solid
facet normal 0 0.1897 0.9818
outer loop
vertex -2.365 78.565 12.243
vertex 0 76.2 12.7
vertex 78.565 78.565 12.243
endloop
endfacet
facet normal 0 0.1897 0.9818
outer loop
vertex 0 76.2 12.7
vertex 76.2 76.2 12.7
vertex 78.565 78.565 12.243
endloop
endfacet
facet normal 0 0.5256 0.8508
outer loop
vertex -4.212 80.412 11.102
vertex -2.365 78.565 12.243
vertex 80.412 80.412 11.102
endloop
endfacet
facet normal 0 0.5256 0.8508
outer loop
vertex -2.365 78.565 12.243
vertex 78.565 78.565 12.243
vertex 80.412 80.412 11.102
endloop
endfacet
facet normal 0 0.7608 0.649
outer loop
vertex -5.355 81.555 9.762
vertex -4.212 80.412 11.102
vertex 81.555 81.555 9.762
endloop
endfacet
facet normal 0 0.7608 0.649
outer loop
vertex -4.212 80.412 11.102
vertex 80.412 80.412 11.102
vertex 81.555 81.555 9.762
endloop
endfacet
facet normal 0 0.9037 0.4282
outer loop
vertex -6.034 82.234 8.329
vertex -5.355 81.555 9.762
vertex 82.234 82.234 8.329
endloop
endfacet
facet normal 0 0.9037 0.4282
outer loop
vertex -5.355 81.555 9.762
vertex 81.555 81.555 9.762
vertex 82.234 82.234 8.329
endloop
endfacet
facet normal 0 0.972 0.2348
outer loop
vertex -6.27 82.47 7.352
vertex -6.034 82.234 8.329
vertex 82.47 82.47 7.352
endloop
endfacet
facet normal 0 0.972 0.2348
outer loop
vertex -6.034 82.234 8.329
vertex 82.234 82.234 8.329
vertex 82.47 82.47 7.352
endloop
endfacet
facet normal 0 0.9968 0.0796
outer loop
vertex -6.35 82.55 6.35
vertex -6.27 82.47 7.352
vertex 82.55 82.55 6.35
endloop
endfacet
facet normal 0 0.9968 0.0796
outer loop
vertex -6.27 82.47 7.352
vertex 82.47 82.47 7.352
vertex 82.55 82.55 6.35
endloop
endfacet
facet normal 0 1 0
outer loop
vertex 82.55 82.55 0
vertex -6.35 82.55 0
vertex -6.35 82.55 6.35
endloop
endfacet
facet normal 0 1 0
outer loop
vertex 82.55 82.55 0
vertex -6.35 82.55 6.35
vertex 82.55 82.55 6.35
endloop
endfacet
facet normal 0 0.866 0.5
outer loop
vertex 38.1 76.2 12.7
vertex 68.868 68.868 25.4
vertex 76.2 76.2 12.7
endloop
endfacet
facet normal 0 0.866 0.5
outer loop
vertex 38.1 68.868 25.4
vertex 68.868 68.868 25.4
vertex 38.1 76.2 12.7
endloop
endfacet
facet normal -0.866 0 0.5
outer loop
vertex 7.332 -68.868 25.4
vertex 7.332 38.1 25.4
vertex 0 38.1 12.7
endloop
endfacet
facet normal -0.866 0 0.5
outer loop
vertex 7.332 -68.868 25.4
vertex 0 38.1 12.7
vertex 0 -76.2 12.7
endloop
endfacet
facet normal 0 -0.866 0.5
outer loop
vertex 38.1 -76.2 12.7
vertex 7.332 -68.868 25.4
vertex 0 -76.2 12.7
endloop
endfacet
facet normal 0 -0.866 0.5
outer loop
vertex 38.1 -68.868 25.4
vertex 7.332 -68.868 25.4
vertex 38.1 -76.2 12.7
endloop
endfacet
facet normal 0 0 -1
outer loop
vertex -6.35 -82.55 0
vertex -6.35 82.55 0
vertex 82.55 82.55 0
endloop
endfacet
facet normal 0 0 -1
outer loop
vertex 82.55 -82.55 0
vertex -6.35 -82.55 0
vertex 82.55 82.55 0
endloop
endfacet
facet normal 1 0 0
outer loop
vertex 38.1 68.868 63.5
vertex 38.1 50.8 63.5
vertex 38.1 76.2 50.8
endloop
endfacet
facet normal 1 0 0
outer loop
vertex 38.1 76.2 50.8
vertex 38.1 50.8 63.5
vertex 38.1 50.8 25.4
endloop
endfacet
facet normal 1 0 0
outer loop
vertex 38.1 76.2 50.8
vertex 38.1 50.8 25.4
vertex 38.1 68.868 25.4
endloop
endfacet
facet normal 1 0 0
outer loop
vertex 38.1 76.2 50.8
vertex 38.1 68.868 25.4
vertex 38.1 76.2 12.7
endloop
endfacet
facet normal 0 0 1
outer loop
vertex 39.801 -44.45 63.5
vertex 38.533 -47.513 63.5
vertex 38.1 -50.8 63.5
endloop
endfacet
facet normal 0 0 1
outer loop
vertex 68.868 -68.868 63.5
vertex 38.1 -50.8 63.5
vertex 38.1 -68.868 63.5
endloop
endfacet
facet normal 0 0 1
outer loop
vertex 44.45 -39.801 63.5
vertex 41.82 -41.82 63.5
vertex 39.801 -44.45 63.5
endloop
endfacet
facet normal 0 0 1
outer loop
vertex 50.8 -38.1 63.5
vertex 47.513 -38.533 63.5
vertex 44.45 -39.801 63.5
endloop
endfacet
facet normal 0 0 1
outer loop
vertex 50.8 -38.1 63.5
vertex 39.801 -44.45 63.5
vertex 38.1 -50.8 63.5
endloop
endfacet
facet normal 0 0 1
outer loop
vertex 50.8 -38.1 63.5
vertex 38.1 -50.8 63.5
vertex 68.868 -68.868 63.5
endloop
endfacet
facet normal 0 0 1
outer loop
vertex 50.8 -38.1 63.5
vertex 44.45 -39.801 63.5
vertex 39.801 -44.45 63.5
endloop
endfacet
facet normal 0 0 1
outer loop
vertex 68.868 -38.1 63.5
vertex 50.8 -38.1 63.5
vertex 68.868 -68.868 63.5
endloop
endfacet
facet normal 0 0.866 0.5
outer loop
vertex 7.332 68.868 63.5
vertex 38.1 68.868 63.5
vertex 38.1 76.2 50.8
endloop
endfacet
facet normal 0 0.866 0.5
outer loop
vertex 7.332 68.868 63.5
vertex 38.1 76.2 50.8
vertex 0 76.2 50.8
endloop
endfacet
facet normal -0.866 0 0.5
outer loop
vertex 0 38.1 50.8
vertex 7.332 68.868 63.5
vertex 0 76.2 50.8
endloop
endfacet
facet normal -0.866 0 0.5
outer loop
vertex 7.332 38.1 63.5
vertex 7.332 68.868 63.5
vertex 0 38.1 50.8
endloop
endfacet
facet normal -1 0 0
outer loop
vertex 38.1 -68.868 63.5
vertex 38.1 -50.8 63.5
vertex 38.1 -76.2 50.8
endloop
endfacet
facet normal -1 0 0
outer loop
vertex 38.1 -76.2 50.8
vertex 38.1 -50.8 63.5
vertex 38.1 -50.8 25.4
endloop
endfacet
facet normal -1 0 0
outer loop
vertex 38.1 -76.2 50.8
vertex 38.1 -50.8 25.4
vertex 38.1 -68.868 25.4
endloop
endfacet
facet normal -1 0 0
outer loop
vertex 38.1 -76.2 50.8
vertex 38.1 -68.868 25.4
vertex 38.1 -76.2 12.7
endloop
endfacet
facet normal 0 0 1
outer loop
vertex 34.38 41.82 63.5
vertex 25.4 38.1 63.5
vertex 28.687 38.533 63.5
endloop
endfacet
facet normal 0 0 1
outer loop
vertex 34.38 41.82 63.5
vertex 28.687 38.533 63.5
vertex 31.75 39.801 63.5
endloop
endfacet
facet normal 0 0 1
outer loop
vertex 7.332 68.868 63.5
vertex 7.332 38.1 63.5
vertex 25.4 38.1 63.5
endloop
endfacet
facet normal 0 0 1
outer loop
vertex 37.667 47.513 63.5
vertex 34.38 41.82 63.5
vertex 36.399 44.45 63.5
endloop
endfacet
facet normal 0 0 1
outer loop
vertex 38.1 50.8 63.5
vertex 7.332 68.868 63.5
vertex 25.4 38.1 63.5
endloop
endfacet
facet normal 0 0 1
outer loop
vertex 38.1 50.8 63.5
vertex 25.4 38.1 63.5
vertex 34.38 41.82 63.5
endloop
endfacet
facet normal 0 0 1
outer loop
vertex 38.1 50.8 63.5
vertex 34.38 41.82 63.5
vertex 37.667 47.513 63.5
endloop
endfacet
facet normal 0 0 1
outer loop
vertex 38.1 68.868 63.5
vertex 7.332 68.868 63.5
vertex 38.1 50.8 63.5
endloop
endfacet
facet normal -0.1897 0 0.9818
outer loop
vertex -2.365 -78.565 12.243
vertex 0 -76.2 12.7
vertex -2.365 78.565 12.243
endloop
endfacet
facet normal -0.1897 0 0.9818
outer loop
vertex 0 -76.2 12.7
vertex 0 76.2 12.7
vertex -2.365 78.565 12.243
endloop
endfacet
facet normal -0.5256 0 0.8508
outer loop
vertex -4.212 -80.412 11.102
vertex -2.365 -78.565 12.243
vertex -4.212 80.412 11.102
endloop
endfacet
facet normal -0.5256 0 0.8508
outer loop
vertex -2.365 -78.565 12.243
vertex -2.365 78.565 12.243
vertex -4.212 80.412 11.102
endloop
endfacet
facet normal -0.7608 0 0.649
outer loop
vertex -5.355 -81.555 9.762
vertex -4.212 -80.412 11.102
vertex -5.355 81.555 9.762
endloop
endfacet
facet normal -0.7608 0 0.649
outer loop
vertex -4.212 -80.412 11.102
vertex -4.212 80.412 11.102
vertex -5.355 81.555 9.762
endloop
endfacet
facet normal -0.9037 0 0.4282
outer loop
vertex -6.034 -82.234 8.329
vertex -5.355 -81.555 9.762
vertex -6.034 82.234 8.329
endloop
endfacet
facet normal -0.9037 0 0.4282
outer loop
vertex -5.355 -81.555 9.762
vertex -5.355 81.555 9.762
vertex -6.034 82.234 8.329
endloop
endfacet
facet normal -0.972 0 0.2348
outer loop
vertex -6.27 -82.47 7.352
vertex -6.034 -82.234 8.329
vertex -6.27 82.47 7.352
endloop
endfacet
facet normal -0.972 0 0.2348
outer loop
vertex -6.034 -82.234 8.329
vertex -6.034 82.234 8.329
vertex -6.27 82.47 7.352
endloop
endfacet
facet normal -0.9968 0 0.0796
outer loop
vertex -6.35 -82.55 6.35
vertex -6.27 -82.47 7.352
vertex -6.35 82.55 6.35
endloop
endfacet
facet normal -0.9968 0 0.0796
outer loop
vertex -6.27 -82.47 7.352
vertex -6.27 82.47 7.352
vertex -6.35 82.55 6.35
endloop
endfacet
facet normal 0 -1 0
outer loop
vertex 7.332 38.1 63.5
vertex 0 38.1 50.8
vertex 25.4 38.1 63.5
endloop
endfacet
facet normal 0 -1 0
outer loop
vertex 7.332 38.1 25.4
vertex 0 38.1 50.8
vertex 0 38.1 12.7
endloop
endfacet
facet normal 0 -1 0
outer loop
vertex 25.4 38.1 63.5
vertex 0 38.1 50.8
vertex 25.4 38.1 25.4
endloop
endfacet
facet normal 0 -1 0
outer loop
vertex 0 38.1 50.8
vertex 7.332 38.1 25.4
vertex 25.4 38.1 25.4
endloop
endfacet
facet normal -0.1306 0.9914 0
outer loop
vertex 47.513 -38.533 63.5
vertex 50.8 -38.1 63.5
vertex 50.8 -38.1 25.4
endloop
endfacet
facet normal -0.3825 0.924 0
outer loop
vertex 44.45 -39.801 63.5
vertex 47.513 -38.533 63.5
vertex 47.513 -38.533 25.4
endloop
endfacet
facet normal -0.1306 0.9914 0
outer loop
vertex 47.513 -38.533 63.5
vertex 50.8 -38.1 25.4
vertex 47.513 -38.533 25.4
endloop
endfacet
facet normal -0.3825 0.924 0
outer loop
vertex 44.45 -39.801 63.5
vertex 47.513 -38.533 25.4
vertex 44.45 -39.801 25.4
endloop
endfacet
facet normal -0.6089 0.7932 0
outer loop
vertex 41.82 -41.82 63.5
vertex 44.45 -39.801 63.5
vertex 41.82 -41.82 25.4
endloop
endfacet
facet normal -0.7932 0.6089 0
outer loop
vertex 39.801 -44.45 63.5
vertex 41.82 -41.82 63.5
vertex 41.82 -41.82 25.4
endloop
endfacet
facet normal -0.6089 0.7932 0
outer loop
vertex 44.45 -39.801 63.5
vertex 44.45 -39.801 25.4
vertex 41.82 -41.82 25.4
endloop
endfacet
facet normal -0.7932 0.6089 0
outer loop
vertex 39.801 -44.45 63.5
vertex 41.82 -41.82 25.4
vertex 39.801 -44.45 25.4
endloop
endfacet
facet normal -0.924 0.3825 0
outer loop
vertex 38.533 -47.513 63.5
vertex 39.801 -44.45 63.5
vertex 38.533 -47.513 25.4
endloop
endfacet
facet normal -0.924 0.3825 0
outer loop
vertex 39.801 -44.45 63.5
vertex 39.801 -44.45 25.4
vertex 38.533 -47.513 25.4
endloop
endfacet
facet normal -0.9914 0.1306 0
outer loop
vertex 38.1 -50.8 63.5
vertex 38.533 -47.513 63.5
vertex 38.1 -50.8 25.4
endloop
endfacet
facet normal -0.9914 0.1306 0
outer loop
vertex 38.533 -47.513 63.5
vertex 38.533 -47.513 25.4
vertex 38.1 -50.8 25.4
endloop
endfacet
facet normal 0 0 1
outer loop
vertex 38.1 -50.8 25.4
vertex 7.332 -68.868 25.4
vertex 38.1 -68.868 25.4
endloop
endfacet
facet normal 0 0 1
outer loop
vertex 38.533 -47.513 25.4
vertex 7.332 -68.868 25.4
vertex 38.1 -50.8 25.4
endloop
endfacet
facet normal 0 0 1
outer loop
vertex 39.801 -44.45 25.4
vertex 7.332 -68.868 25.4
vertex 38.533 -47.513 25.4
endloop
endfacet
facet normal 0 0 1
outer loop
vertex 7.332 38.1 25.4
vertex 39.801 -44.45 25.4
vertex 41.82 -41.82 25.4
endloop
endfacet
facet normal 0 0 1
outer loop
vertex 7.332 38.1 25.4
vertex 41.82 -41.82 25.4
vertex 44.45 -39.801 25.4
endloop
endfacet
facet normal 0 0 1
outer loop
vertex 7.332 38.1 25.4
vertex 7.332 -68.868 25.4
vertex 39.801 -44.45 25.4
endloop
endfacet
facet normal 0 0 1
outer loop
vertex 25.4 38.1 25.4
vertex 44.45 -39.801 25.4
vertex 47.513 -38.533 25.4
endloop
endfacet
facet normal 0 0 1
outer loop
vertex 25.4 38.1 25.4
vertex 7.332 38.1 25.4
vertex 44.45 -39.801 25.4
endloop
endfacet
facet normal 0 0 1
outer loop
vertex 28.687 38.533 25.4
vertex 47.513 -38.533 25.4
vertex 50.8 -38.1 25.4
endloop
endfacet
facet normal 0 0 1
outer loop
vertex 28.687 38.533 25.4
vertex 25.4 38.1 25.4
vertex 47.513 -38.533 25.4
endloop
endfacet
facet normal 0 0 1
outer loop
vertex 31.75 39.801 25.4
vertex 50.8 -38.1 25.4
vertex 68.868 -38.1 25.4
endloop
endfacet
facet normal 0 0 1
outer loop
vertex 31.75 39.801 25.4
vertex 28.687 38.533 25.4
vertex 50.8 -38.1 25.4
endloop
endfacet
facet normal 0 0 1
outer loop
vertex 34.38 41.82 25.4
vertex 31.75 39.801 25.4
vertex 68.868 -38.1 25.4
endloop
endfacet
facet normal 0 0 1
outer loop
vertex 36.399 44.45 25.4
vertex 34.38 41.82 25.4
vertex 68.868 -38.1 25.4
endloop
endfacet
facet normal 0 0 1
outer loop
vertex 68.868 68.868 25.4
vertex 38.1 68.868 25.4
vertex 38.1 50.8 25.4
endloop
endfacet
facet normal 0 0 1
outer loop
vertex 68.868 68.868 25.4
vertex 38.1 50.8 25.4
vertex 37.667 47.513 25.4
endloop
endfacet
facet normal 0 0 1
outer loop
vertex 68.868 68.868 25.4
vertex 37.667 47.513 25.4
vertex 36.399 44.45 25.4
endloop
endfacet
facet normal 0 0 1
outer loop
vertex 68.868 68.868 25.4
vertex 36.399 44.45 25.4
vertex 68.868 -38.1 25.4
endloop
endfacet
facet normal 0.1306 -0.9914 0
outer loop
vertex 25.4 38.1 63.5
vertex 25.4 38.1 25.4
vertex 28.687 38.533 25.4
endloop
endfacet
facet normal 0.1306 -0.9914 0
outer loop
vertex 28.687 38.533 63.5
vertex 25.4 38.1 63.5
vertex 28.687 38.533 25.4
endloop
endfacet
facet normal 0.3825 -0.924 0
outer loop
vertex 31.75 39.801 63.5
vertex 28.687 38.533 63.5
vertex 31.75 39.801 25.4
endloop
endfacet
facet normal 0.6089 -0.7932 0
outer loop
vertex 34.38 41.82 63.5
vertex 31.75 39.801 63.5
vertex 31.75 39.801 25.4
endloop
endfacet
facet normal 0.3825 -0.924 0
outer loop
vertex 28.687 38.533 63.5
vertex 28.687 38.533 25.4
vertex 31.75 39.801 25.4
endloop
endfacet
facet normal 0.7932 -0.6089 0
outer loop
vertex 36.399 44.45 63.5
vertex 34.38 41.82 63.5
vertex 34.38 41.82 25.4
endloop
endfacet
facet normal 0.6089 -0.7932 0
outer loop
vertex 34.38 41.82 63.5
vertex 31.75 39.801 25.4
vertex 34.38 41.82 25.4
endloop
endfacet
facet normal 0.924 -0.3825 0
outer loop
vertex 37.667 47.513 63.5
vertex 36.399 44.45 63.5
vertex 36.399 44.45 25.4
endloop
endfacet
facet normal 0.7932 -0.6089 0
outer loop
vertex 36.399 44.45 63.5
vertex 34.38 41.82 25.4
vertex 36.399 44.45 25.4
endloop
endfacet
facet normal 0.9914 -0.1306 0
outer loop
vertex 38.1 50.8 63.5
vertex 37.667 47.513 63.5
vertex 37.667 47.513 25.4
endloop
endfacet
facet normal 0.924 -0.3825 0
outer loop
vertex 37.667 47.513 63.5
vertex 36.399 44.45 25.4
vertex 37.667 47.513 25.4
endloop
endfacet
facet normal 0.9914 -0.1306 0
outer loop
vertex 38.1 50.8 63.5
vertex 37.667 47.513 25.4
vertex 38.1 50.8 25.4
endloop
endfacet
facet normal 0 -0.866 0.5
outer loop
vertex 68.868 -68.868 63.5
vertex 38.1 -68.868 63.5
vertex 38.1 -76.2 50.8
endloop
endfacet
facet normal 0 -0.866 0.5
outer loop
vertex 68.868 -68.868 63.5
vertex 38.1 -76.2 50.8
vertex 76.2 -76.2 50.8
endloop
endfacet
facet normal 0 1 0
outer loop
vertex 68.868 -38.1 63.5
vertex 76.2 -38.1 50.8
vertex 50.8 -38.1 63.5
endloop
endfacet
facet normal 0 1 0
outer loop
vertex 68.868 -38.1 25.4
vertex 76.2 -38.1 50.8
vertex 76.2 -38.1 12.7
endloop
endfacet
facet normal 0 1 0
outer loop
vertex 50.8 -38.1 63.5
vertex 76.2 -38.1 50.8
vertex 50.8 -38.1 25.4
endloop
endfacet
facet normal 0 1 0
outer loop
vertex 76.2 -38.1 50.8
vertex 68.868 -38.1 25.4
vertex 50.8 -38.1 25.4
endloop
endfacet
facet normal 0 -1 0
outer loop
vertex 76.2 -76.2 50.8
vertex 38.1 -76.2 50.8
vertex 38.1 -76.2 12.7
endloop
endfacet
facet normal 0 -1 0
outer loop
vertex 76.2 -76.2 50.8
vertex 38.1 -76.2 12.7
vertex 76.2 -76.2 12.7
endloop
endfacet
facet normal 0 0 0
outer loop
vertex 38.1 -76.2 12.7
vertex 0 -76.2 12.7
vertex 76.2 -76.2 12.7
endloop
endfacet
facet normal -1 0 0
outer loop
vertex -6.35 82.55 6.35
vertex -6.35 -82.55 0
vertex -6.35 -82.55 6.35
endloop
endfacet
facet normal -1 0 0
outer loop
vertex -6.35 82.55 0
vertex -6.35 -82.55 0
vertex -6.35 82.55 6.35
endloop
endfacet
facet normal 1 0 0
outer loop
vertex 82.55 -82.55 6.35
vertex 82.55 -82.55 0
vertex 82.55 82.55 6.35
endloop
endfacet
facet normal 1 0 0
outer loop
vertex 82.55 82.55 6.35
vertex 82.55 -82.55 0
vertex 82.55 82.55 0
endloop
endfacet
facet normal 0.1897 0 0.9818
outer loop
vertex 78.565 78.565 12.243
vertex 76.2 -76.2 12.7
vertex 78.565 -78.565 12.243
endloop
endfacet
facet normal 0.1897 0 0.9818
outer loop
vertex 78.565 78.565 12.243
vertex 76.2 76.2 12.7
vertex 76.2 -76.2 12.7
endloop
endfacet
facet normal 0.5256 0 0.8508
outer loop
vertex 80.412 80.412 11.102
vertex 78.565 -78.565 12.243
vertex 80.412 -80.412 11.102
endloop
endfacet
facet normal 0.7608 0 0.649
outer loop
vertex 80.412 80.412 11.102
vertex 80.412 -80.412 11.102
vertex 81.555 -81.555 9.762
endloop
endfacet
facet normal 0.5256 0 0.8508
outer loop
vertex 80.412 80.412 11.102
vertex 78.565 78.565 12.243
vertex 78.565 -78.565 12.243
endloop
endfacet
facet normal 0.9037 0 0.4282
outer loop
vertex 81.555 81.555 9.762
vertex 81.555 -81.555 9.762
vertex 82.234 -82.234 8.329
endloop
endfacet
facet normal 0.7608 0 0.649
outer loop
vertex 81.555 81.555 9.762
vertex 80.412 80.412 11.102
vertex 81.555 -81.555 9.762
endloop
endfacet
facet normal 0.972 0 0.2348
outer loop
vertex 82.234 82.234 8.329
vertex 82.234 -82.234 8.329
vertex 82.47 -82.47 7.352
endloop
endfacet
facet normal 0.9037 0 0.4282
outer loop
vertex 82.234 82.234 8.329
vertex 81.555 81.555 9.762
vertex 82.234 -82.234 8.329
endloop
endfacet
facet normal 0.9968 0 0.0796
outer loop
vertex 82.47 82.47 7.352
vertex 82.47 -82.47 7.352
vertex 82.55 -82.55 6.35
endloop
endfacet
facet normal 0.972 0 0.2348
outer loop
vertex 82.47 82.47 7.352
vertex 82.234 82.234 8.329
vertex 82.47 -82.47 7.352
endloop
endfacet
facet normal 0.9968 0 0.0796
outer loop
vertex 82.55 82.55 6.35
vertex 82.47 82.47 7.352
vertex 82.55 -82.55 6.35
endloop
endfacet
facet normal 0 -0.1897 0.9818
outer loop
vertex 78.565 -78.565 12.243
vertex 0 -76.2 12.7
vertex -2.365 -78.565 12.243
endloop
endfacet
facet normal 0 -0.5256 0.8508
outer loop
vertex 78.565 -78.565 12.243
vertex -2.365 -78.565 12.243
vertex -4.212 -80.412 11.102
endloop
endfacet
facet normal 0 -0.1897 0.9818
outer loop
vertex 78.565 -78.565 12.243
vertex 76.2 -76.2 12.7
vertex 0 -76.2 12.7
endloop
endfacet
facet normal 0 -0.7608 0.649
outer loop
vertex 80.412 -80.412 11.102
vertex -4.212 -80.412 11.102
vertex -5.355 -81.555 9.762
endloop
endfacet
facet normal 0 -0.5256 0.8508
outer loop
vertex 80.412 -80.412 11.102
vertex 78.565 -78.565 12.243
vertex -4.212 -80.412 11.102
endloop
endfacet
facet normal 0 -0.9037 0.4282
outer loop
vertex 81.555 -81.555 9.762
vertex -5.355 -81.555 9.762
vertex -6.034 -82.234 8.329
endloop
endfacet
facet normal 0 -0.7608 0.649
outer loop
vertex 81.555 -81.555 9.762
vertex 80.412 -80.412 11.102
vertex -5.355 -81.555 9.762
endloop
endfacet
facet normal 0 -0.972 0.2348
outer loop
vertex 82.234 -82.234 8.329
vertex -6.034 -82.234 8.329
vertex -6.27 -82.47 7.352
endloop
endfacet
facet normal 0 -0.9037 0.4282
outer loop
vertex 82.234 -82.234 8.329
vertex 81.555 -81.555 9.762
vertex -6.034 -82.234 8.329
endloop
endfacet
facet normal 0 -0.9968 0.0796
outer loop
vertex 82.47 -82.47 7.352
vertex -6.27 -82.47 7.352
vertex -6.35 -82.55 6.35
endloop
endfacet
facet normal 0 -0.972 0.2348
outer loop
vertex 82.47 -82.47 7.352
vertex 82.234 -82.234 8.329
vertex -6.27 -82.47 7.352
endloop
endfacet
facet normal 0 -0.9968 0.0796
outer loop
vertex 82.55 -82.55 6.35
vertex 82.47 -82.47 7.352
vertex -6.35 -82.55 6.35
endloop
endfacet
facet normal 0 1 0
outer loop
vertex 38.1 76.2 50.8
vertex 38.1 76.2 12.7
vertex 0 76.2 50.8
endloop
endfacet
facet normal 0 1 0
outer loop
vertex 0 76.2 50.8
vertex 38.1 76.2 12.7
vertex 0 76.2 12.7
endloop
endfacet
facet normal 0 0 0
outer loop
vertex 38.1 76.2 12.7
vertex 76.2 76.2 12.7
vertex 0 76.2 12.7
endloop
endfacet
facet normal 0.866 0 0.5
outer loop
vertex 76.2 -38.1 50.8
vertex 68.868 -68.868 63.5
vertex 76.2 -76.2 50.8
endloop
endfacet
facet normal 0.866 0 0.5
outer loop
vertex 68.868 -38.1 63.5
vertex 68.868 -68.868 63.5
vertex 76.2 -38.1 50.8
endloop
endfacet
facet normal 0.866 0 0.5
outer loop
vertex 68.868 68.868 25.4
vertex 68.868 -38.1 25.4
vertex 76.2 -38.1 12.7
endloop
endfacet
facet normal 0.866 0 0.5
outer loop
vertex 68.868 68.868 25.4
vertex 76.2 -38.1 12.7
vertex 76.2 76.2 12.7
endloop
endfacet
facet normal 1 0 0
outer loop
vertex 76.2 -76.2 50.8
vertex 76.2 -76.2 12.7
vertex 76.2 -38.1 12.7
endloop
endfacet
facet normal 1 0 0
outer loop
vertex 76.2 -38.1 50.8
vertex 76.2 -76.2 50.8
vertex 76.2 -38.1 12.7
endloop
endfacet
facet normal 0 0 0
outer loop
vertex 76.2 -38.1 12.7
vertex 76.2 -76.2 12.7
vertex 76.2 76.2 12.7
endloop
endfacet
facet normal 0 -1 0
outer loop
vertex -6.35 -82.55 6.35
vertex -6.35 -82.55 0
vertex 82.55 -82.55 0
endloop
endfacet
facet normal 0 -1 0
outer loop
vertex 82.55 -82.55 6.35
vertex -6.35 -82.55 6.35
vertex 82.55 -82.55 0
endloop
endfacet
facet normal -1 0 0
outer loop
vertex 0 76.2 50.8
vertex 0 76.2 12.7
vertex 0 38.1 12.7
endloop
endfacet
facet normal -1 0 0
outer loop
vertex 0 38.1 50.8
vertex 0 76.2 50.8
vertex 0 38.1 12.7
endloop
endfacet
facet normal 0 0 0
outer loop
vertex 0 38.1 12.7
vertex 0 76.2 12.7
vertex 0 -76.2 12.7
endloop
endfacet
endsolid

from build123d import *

# Parameters (mm, degrees)
F0_W     = 88.9000000224
F0_H     = 165.1000027703
F1_DEPTH = 12.7
F2_DEPTH = 25.4
F3_DEPTH = 63.5
F4_R     = 6.34999
F5_SIZE2 = 7.332338
F5_SIZE  = 12.69999


# Not quite as in the source:
# - a fillet or chamfer is up to 0.001 mm smaller than in the source, because OpenCascade refuses the exact size


with BuildPart() as f1:
    # F0 (on Top) → F1 (new body)
    with BuildSketch(Plane.XY):
        with Locations((38.1000000112, -1.3851e-06)):
            Rectangle(F0_W, F0_H)
        Polygon((0, 38.1), (0, 76.2), (38.1, 76.2), (76.2, 76.2), (76.2, -38.1), (76.2, -76.2), (38.1, -76.2), (0, -76.2), align=None, mode=Mode.SUBTRACT)
    extrude(amount=F1_DEPTH)

    # F0 (on Top) → F2 (join)
    with BuildSketch(Plane.XY):
        with BuildLine():
            Line((25.4, 38.1), (0, 38.1))
            Line((0, 38.1), (0, -76.2))
            Line((0, -76.2), (38.1, -76.2))
            Line((38.1, -76.2), (38.1, -50.8))
            ThreePointArc((38.1, -50.8), (41.8197438789, -41.8197438789), (50.8, -38.1))
            Line((50.8, -38.1), (76.2, -38.1))
            Line((76.2, -38.1), (76.2, 76.2))
            Line((76.2, 76.2), (38.1, 76.2))
            Line((38.1, 76.2), (38.1, 50.8))
            ThreePointArc((38.1, 50.8), (34.3802561211, 41.8197438789), (25.4, 38.1))
        make_face()
    extrude(amount=F2_DEPTH)

    # F0 (on Top) → F3 (join)
    with BuildSketch(Plane.XY):
        with BuildLine():
            Line((38.1, 76.2), (0, 76.2))
            Line((0, 76.2), (0, 38.1))
            Line((0, 38.1), (25.4, 38.1))
            ThreePointArc((25.4, 38.1), (34.3802561211, 41.8197438789), (38.1, 50.8))
            Line((38.1, 50.8), (38.1, 76.2))
        make_face()
        with BuildLine():
            Line((38.1, -50.8), (38.1, -76.2))
            Line((38.1, -76.2), (76.2, -76.2))
            Line((76.2, -76.2), (76.2, -38.1))
            Line((76.2, -38.1), (50.8, -38.1))
            ThreePointArc((50.8, -38.1), (41.8197438789, -41.8197438789), (38.1, -50.8))
        make_face()
    extrude(amount=F3_DEPTH)

    # F4 (radius 6.35 in the source; OpenCascade refuses exactly that, so slightly less here)
    f4_edges = [f1.edges().sort_by_distance(p)[0] for p in [
        (-6.35, -1e-06, 12.7),
        (38.1, -82.550003, 12.7),
        (82.55, -1e-06, 12.7),
        (38.1, 82.55, 12.7),
    ]]
    fillet(f4_edges, radius=F4_R)

    # F5 (size 12.7 and 7.3323484187 in the source; OpenCascade refuses exactly that, so slightly less here)
    f5_edges = [f1.edges().sort_by_distance(p)[0] for p in [
        (57.15, 76.2, 25.4),
        (76.2, 19.05, 25.4),
        (0, -19.05, 25.4),
        (19.05, -76.2, 25.4),
        (57.15, -76.2, 63.5),
        (76.2, -57.15, 63.5),
        (19.05, 76.2, 63.5),
        (0, 57.15, 63.5),
    ]]
    chamfer(f5_edges, length=F5_SIZE, length2=F5_SIZE2)


solid = f1.part
